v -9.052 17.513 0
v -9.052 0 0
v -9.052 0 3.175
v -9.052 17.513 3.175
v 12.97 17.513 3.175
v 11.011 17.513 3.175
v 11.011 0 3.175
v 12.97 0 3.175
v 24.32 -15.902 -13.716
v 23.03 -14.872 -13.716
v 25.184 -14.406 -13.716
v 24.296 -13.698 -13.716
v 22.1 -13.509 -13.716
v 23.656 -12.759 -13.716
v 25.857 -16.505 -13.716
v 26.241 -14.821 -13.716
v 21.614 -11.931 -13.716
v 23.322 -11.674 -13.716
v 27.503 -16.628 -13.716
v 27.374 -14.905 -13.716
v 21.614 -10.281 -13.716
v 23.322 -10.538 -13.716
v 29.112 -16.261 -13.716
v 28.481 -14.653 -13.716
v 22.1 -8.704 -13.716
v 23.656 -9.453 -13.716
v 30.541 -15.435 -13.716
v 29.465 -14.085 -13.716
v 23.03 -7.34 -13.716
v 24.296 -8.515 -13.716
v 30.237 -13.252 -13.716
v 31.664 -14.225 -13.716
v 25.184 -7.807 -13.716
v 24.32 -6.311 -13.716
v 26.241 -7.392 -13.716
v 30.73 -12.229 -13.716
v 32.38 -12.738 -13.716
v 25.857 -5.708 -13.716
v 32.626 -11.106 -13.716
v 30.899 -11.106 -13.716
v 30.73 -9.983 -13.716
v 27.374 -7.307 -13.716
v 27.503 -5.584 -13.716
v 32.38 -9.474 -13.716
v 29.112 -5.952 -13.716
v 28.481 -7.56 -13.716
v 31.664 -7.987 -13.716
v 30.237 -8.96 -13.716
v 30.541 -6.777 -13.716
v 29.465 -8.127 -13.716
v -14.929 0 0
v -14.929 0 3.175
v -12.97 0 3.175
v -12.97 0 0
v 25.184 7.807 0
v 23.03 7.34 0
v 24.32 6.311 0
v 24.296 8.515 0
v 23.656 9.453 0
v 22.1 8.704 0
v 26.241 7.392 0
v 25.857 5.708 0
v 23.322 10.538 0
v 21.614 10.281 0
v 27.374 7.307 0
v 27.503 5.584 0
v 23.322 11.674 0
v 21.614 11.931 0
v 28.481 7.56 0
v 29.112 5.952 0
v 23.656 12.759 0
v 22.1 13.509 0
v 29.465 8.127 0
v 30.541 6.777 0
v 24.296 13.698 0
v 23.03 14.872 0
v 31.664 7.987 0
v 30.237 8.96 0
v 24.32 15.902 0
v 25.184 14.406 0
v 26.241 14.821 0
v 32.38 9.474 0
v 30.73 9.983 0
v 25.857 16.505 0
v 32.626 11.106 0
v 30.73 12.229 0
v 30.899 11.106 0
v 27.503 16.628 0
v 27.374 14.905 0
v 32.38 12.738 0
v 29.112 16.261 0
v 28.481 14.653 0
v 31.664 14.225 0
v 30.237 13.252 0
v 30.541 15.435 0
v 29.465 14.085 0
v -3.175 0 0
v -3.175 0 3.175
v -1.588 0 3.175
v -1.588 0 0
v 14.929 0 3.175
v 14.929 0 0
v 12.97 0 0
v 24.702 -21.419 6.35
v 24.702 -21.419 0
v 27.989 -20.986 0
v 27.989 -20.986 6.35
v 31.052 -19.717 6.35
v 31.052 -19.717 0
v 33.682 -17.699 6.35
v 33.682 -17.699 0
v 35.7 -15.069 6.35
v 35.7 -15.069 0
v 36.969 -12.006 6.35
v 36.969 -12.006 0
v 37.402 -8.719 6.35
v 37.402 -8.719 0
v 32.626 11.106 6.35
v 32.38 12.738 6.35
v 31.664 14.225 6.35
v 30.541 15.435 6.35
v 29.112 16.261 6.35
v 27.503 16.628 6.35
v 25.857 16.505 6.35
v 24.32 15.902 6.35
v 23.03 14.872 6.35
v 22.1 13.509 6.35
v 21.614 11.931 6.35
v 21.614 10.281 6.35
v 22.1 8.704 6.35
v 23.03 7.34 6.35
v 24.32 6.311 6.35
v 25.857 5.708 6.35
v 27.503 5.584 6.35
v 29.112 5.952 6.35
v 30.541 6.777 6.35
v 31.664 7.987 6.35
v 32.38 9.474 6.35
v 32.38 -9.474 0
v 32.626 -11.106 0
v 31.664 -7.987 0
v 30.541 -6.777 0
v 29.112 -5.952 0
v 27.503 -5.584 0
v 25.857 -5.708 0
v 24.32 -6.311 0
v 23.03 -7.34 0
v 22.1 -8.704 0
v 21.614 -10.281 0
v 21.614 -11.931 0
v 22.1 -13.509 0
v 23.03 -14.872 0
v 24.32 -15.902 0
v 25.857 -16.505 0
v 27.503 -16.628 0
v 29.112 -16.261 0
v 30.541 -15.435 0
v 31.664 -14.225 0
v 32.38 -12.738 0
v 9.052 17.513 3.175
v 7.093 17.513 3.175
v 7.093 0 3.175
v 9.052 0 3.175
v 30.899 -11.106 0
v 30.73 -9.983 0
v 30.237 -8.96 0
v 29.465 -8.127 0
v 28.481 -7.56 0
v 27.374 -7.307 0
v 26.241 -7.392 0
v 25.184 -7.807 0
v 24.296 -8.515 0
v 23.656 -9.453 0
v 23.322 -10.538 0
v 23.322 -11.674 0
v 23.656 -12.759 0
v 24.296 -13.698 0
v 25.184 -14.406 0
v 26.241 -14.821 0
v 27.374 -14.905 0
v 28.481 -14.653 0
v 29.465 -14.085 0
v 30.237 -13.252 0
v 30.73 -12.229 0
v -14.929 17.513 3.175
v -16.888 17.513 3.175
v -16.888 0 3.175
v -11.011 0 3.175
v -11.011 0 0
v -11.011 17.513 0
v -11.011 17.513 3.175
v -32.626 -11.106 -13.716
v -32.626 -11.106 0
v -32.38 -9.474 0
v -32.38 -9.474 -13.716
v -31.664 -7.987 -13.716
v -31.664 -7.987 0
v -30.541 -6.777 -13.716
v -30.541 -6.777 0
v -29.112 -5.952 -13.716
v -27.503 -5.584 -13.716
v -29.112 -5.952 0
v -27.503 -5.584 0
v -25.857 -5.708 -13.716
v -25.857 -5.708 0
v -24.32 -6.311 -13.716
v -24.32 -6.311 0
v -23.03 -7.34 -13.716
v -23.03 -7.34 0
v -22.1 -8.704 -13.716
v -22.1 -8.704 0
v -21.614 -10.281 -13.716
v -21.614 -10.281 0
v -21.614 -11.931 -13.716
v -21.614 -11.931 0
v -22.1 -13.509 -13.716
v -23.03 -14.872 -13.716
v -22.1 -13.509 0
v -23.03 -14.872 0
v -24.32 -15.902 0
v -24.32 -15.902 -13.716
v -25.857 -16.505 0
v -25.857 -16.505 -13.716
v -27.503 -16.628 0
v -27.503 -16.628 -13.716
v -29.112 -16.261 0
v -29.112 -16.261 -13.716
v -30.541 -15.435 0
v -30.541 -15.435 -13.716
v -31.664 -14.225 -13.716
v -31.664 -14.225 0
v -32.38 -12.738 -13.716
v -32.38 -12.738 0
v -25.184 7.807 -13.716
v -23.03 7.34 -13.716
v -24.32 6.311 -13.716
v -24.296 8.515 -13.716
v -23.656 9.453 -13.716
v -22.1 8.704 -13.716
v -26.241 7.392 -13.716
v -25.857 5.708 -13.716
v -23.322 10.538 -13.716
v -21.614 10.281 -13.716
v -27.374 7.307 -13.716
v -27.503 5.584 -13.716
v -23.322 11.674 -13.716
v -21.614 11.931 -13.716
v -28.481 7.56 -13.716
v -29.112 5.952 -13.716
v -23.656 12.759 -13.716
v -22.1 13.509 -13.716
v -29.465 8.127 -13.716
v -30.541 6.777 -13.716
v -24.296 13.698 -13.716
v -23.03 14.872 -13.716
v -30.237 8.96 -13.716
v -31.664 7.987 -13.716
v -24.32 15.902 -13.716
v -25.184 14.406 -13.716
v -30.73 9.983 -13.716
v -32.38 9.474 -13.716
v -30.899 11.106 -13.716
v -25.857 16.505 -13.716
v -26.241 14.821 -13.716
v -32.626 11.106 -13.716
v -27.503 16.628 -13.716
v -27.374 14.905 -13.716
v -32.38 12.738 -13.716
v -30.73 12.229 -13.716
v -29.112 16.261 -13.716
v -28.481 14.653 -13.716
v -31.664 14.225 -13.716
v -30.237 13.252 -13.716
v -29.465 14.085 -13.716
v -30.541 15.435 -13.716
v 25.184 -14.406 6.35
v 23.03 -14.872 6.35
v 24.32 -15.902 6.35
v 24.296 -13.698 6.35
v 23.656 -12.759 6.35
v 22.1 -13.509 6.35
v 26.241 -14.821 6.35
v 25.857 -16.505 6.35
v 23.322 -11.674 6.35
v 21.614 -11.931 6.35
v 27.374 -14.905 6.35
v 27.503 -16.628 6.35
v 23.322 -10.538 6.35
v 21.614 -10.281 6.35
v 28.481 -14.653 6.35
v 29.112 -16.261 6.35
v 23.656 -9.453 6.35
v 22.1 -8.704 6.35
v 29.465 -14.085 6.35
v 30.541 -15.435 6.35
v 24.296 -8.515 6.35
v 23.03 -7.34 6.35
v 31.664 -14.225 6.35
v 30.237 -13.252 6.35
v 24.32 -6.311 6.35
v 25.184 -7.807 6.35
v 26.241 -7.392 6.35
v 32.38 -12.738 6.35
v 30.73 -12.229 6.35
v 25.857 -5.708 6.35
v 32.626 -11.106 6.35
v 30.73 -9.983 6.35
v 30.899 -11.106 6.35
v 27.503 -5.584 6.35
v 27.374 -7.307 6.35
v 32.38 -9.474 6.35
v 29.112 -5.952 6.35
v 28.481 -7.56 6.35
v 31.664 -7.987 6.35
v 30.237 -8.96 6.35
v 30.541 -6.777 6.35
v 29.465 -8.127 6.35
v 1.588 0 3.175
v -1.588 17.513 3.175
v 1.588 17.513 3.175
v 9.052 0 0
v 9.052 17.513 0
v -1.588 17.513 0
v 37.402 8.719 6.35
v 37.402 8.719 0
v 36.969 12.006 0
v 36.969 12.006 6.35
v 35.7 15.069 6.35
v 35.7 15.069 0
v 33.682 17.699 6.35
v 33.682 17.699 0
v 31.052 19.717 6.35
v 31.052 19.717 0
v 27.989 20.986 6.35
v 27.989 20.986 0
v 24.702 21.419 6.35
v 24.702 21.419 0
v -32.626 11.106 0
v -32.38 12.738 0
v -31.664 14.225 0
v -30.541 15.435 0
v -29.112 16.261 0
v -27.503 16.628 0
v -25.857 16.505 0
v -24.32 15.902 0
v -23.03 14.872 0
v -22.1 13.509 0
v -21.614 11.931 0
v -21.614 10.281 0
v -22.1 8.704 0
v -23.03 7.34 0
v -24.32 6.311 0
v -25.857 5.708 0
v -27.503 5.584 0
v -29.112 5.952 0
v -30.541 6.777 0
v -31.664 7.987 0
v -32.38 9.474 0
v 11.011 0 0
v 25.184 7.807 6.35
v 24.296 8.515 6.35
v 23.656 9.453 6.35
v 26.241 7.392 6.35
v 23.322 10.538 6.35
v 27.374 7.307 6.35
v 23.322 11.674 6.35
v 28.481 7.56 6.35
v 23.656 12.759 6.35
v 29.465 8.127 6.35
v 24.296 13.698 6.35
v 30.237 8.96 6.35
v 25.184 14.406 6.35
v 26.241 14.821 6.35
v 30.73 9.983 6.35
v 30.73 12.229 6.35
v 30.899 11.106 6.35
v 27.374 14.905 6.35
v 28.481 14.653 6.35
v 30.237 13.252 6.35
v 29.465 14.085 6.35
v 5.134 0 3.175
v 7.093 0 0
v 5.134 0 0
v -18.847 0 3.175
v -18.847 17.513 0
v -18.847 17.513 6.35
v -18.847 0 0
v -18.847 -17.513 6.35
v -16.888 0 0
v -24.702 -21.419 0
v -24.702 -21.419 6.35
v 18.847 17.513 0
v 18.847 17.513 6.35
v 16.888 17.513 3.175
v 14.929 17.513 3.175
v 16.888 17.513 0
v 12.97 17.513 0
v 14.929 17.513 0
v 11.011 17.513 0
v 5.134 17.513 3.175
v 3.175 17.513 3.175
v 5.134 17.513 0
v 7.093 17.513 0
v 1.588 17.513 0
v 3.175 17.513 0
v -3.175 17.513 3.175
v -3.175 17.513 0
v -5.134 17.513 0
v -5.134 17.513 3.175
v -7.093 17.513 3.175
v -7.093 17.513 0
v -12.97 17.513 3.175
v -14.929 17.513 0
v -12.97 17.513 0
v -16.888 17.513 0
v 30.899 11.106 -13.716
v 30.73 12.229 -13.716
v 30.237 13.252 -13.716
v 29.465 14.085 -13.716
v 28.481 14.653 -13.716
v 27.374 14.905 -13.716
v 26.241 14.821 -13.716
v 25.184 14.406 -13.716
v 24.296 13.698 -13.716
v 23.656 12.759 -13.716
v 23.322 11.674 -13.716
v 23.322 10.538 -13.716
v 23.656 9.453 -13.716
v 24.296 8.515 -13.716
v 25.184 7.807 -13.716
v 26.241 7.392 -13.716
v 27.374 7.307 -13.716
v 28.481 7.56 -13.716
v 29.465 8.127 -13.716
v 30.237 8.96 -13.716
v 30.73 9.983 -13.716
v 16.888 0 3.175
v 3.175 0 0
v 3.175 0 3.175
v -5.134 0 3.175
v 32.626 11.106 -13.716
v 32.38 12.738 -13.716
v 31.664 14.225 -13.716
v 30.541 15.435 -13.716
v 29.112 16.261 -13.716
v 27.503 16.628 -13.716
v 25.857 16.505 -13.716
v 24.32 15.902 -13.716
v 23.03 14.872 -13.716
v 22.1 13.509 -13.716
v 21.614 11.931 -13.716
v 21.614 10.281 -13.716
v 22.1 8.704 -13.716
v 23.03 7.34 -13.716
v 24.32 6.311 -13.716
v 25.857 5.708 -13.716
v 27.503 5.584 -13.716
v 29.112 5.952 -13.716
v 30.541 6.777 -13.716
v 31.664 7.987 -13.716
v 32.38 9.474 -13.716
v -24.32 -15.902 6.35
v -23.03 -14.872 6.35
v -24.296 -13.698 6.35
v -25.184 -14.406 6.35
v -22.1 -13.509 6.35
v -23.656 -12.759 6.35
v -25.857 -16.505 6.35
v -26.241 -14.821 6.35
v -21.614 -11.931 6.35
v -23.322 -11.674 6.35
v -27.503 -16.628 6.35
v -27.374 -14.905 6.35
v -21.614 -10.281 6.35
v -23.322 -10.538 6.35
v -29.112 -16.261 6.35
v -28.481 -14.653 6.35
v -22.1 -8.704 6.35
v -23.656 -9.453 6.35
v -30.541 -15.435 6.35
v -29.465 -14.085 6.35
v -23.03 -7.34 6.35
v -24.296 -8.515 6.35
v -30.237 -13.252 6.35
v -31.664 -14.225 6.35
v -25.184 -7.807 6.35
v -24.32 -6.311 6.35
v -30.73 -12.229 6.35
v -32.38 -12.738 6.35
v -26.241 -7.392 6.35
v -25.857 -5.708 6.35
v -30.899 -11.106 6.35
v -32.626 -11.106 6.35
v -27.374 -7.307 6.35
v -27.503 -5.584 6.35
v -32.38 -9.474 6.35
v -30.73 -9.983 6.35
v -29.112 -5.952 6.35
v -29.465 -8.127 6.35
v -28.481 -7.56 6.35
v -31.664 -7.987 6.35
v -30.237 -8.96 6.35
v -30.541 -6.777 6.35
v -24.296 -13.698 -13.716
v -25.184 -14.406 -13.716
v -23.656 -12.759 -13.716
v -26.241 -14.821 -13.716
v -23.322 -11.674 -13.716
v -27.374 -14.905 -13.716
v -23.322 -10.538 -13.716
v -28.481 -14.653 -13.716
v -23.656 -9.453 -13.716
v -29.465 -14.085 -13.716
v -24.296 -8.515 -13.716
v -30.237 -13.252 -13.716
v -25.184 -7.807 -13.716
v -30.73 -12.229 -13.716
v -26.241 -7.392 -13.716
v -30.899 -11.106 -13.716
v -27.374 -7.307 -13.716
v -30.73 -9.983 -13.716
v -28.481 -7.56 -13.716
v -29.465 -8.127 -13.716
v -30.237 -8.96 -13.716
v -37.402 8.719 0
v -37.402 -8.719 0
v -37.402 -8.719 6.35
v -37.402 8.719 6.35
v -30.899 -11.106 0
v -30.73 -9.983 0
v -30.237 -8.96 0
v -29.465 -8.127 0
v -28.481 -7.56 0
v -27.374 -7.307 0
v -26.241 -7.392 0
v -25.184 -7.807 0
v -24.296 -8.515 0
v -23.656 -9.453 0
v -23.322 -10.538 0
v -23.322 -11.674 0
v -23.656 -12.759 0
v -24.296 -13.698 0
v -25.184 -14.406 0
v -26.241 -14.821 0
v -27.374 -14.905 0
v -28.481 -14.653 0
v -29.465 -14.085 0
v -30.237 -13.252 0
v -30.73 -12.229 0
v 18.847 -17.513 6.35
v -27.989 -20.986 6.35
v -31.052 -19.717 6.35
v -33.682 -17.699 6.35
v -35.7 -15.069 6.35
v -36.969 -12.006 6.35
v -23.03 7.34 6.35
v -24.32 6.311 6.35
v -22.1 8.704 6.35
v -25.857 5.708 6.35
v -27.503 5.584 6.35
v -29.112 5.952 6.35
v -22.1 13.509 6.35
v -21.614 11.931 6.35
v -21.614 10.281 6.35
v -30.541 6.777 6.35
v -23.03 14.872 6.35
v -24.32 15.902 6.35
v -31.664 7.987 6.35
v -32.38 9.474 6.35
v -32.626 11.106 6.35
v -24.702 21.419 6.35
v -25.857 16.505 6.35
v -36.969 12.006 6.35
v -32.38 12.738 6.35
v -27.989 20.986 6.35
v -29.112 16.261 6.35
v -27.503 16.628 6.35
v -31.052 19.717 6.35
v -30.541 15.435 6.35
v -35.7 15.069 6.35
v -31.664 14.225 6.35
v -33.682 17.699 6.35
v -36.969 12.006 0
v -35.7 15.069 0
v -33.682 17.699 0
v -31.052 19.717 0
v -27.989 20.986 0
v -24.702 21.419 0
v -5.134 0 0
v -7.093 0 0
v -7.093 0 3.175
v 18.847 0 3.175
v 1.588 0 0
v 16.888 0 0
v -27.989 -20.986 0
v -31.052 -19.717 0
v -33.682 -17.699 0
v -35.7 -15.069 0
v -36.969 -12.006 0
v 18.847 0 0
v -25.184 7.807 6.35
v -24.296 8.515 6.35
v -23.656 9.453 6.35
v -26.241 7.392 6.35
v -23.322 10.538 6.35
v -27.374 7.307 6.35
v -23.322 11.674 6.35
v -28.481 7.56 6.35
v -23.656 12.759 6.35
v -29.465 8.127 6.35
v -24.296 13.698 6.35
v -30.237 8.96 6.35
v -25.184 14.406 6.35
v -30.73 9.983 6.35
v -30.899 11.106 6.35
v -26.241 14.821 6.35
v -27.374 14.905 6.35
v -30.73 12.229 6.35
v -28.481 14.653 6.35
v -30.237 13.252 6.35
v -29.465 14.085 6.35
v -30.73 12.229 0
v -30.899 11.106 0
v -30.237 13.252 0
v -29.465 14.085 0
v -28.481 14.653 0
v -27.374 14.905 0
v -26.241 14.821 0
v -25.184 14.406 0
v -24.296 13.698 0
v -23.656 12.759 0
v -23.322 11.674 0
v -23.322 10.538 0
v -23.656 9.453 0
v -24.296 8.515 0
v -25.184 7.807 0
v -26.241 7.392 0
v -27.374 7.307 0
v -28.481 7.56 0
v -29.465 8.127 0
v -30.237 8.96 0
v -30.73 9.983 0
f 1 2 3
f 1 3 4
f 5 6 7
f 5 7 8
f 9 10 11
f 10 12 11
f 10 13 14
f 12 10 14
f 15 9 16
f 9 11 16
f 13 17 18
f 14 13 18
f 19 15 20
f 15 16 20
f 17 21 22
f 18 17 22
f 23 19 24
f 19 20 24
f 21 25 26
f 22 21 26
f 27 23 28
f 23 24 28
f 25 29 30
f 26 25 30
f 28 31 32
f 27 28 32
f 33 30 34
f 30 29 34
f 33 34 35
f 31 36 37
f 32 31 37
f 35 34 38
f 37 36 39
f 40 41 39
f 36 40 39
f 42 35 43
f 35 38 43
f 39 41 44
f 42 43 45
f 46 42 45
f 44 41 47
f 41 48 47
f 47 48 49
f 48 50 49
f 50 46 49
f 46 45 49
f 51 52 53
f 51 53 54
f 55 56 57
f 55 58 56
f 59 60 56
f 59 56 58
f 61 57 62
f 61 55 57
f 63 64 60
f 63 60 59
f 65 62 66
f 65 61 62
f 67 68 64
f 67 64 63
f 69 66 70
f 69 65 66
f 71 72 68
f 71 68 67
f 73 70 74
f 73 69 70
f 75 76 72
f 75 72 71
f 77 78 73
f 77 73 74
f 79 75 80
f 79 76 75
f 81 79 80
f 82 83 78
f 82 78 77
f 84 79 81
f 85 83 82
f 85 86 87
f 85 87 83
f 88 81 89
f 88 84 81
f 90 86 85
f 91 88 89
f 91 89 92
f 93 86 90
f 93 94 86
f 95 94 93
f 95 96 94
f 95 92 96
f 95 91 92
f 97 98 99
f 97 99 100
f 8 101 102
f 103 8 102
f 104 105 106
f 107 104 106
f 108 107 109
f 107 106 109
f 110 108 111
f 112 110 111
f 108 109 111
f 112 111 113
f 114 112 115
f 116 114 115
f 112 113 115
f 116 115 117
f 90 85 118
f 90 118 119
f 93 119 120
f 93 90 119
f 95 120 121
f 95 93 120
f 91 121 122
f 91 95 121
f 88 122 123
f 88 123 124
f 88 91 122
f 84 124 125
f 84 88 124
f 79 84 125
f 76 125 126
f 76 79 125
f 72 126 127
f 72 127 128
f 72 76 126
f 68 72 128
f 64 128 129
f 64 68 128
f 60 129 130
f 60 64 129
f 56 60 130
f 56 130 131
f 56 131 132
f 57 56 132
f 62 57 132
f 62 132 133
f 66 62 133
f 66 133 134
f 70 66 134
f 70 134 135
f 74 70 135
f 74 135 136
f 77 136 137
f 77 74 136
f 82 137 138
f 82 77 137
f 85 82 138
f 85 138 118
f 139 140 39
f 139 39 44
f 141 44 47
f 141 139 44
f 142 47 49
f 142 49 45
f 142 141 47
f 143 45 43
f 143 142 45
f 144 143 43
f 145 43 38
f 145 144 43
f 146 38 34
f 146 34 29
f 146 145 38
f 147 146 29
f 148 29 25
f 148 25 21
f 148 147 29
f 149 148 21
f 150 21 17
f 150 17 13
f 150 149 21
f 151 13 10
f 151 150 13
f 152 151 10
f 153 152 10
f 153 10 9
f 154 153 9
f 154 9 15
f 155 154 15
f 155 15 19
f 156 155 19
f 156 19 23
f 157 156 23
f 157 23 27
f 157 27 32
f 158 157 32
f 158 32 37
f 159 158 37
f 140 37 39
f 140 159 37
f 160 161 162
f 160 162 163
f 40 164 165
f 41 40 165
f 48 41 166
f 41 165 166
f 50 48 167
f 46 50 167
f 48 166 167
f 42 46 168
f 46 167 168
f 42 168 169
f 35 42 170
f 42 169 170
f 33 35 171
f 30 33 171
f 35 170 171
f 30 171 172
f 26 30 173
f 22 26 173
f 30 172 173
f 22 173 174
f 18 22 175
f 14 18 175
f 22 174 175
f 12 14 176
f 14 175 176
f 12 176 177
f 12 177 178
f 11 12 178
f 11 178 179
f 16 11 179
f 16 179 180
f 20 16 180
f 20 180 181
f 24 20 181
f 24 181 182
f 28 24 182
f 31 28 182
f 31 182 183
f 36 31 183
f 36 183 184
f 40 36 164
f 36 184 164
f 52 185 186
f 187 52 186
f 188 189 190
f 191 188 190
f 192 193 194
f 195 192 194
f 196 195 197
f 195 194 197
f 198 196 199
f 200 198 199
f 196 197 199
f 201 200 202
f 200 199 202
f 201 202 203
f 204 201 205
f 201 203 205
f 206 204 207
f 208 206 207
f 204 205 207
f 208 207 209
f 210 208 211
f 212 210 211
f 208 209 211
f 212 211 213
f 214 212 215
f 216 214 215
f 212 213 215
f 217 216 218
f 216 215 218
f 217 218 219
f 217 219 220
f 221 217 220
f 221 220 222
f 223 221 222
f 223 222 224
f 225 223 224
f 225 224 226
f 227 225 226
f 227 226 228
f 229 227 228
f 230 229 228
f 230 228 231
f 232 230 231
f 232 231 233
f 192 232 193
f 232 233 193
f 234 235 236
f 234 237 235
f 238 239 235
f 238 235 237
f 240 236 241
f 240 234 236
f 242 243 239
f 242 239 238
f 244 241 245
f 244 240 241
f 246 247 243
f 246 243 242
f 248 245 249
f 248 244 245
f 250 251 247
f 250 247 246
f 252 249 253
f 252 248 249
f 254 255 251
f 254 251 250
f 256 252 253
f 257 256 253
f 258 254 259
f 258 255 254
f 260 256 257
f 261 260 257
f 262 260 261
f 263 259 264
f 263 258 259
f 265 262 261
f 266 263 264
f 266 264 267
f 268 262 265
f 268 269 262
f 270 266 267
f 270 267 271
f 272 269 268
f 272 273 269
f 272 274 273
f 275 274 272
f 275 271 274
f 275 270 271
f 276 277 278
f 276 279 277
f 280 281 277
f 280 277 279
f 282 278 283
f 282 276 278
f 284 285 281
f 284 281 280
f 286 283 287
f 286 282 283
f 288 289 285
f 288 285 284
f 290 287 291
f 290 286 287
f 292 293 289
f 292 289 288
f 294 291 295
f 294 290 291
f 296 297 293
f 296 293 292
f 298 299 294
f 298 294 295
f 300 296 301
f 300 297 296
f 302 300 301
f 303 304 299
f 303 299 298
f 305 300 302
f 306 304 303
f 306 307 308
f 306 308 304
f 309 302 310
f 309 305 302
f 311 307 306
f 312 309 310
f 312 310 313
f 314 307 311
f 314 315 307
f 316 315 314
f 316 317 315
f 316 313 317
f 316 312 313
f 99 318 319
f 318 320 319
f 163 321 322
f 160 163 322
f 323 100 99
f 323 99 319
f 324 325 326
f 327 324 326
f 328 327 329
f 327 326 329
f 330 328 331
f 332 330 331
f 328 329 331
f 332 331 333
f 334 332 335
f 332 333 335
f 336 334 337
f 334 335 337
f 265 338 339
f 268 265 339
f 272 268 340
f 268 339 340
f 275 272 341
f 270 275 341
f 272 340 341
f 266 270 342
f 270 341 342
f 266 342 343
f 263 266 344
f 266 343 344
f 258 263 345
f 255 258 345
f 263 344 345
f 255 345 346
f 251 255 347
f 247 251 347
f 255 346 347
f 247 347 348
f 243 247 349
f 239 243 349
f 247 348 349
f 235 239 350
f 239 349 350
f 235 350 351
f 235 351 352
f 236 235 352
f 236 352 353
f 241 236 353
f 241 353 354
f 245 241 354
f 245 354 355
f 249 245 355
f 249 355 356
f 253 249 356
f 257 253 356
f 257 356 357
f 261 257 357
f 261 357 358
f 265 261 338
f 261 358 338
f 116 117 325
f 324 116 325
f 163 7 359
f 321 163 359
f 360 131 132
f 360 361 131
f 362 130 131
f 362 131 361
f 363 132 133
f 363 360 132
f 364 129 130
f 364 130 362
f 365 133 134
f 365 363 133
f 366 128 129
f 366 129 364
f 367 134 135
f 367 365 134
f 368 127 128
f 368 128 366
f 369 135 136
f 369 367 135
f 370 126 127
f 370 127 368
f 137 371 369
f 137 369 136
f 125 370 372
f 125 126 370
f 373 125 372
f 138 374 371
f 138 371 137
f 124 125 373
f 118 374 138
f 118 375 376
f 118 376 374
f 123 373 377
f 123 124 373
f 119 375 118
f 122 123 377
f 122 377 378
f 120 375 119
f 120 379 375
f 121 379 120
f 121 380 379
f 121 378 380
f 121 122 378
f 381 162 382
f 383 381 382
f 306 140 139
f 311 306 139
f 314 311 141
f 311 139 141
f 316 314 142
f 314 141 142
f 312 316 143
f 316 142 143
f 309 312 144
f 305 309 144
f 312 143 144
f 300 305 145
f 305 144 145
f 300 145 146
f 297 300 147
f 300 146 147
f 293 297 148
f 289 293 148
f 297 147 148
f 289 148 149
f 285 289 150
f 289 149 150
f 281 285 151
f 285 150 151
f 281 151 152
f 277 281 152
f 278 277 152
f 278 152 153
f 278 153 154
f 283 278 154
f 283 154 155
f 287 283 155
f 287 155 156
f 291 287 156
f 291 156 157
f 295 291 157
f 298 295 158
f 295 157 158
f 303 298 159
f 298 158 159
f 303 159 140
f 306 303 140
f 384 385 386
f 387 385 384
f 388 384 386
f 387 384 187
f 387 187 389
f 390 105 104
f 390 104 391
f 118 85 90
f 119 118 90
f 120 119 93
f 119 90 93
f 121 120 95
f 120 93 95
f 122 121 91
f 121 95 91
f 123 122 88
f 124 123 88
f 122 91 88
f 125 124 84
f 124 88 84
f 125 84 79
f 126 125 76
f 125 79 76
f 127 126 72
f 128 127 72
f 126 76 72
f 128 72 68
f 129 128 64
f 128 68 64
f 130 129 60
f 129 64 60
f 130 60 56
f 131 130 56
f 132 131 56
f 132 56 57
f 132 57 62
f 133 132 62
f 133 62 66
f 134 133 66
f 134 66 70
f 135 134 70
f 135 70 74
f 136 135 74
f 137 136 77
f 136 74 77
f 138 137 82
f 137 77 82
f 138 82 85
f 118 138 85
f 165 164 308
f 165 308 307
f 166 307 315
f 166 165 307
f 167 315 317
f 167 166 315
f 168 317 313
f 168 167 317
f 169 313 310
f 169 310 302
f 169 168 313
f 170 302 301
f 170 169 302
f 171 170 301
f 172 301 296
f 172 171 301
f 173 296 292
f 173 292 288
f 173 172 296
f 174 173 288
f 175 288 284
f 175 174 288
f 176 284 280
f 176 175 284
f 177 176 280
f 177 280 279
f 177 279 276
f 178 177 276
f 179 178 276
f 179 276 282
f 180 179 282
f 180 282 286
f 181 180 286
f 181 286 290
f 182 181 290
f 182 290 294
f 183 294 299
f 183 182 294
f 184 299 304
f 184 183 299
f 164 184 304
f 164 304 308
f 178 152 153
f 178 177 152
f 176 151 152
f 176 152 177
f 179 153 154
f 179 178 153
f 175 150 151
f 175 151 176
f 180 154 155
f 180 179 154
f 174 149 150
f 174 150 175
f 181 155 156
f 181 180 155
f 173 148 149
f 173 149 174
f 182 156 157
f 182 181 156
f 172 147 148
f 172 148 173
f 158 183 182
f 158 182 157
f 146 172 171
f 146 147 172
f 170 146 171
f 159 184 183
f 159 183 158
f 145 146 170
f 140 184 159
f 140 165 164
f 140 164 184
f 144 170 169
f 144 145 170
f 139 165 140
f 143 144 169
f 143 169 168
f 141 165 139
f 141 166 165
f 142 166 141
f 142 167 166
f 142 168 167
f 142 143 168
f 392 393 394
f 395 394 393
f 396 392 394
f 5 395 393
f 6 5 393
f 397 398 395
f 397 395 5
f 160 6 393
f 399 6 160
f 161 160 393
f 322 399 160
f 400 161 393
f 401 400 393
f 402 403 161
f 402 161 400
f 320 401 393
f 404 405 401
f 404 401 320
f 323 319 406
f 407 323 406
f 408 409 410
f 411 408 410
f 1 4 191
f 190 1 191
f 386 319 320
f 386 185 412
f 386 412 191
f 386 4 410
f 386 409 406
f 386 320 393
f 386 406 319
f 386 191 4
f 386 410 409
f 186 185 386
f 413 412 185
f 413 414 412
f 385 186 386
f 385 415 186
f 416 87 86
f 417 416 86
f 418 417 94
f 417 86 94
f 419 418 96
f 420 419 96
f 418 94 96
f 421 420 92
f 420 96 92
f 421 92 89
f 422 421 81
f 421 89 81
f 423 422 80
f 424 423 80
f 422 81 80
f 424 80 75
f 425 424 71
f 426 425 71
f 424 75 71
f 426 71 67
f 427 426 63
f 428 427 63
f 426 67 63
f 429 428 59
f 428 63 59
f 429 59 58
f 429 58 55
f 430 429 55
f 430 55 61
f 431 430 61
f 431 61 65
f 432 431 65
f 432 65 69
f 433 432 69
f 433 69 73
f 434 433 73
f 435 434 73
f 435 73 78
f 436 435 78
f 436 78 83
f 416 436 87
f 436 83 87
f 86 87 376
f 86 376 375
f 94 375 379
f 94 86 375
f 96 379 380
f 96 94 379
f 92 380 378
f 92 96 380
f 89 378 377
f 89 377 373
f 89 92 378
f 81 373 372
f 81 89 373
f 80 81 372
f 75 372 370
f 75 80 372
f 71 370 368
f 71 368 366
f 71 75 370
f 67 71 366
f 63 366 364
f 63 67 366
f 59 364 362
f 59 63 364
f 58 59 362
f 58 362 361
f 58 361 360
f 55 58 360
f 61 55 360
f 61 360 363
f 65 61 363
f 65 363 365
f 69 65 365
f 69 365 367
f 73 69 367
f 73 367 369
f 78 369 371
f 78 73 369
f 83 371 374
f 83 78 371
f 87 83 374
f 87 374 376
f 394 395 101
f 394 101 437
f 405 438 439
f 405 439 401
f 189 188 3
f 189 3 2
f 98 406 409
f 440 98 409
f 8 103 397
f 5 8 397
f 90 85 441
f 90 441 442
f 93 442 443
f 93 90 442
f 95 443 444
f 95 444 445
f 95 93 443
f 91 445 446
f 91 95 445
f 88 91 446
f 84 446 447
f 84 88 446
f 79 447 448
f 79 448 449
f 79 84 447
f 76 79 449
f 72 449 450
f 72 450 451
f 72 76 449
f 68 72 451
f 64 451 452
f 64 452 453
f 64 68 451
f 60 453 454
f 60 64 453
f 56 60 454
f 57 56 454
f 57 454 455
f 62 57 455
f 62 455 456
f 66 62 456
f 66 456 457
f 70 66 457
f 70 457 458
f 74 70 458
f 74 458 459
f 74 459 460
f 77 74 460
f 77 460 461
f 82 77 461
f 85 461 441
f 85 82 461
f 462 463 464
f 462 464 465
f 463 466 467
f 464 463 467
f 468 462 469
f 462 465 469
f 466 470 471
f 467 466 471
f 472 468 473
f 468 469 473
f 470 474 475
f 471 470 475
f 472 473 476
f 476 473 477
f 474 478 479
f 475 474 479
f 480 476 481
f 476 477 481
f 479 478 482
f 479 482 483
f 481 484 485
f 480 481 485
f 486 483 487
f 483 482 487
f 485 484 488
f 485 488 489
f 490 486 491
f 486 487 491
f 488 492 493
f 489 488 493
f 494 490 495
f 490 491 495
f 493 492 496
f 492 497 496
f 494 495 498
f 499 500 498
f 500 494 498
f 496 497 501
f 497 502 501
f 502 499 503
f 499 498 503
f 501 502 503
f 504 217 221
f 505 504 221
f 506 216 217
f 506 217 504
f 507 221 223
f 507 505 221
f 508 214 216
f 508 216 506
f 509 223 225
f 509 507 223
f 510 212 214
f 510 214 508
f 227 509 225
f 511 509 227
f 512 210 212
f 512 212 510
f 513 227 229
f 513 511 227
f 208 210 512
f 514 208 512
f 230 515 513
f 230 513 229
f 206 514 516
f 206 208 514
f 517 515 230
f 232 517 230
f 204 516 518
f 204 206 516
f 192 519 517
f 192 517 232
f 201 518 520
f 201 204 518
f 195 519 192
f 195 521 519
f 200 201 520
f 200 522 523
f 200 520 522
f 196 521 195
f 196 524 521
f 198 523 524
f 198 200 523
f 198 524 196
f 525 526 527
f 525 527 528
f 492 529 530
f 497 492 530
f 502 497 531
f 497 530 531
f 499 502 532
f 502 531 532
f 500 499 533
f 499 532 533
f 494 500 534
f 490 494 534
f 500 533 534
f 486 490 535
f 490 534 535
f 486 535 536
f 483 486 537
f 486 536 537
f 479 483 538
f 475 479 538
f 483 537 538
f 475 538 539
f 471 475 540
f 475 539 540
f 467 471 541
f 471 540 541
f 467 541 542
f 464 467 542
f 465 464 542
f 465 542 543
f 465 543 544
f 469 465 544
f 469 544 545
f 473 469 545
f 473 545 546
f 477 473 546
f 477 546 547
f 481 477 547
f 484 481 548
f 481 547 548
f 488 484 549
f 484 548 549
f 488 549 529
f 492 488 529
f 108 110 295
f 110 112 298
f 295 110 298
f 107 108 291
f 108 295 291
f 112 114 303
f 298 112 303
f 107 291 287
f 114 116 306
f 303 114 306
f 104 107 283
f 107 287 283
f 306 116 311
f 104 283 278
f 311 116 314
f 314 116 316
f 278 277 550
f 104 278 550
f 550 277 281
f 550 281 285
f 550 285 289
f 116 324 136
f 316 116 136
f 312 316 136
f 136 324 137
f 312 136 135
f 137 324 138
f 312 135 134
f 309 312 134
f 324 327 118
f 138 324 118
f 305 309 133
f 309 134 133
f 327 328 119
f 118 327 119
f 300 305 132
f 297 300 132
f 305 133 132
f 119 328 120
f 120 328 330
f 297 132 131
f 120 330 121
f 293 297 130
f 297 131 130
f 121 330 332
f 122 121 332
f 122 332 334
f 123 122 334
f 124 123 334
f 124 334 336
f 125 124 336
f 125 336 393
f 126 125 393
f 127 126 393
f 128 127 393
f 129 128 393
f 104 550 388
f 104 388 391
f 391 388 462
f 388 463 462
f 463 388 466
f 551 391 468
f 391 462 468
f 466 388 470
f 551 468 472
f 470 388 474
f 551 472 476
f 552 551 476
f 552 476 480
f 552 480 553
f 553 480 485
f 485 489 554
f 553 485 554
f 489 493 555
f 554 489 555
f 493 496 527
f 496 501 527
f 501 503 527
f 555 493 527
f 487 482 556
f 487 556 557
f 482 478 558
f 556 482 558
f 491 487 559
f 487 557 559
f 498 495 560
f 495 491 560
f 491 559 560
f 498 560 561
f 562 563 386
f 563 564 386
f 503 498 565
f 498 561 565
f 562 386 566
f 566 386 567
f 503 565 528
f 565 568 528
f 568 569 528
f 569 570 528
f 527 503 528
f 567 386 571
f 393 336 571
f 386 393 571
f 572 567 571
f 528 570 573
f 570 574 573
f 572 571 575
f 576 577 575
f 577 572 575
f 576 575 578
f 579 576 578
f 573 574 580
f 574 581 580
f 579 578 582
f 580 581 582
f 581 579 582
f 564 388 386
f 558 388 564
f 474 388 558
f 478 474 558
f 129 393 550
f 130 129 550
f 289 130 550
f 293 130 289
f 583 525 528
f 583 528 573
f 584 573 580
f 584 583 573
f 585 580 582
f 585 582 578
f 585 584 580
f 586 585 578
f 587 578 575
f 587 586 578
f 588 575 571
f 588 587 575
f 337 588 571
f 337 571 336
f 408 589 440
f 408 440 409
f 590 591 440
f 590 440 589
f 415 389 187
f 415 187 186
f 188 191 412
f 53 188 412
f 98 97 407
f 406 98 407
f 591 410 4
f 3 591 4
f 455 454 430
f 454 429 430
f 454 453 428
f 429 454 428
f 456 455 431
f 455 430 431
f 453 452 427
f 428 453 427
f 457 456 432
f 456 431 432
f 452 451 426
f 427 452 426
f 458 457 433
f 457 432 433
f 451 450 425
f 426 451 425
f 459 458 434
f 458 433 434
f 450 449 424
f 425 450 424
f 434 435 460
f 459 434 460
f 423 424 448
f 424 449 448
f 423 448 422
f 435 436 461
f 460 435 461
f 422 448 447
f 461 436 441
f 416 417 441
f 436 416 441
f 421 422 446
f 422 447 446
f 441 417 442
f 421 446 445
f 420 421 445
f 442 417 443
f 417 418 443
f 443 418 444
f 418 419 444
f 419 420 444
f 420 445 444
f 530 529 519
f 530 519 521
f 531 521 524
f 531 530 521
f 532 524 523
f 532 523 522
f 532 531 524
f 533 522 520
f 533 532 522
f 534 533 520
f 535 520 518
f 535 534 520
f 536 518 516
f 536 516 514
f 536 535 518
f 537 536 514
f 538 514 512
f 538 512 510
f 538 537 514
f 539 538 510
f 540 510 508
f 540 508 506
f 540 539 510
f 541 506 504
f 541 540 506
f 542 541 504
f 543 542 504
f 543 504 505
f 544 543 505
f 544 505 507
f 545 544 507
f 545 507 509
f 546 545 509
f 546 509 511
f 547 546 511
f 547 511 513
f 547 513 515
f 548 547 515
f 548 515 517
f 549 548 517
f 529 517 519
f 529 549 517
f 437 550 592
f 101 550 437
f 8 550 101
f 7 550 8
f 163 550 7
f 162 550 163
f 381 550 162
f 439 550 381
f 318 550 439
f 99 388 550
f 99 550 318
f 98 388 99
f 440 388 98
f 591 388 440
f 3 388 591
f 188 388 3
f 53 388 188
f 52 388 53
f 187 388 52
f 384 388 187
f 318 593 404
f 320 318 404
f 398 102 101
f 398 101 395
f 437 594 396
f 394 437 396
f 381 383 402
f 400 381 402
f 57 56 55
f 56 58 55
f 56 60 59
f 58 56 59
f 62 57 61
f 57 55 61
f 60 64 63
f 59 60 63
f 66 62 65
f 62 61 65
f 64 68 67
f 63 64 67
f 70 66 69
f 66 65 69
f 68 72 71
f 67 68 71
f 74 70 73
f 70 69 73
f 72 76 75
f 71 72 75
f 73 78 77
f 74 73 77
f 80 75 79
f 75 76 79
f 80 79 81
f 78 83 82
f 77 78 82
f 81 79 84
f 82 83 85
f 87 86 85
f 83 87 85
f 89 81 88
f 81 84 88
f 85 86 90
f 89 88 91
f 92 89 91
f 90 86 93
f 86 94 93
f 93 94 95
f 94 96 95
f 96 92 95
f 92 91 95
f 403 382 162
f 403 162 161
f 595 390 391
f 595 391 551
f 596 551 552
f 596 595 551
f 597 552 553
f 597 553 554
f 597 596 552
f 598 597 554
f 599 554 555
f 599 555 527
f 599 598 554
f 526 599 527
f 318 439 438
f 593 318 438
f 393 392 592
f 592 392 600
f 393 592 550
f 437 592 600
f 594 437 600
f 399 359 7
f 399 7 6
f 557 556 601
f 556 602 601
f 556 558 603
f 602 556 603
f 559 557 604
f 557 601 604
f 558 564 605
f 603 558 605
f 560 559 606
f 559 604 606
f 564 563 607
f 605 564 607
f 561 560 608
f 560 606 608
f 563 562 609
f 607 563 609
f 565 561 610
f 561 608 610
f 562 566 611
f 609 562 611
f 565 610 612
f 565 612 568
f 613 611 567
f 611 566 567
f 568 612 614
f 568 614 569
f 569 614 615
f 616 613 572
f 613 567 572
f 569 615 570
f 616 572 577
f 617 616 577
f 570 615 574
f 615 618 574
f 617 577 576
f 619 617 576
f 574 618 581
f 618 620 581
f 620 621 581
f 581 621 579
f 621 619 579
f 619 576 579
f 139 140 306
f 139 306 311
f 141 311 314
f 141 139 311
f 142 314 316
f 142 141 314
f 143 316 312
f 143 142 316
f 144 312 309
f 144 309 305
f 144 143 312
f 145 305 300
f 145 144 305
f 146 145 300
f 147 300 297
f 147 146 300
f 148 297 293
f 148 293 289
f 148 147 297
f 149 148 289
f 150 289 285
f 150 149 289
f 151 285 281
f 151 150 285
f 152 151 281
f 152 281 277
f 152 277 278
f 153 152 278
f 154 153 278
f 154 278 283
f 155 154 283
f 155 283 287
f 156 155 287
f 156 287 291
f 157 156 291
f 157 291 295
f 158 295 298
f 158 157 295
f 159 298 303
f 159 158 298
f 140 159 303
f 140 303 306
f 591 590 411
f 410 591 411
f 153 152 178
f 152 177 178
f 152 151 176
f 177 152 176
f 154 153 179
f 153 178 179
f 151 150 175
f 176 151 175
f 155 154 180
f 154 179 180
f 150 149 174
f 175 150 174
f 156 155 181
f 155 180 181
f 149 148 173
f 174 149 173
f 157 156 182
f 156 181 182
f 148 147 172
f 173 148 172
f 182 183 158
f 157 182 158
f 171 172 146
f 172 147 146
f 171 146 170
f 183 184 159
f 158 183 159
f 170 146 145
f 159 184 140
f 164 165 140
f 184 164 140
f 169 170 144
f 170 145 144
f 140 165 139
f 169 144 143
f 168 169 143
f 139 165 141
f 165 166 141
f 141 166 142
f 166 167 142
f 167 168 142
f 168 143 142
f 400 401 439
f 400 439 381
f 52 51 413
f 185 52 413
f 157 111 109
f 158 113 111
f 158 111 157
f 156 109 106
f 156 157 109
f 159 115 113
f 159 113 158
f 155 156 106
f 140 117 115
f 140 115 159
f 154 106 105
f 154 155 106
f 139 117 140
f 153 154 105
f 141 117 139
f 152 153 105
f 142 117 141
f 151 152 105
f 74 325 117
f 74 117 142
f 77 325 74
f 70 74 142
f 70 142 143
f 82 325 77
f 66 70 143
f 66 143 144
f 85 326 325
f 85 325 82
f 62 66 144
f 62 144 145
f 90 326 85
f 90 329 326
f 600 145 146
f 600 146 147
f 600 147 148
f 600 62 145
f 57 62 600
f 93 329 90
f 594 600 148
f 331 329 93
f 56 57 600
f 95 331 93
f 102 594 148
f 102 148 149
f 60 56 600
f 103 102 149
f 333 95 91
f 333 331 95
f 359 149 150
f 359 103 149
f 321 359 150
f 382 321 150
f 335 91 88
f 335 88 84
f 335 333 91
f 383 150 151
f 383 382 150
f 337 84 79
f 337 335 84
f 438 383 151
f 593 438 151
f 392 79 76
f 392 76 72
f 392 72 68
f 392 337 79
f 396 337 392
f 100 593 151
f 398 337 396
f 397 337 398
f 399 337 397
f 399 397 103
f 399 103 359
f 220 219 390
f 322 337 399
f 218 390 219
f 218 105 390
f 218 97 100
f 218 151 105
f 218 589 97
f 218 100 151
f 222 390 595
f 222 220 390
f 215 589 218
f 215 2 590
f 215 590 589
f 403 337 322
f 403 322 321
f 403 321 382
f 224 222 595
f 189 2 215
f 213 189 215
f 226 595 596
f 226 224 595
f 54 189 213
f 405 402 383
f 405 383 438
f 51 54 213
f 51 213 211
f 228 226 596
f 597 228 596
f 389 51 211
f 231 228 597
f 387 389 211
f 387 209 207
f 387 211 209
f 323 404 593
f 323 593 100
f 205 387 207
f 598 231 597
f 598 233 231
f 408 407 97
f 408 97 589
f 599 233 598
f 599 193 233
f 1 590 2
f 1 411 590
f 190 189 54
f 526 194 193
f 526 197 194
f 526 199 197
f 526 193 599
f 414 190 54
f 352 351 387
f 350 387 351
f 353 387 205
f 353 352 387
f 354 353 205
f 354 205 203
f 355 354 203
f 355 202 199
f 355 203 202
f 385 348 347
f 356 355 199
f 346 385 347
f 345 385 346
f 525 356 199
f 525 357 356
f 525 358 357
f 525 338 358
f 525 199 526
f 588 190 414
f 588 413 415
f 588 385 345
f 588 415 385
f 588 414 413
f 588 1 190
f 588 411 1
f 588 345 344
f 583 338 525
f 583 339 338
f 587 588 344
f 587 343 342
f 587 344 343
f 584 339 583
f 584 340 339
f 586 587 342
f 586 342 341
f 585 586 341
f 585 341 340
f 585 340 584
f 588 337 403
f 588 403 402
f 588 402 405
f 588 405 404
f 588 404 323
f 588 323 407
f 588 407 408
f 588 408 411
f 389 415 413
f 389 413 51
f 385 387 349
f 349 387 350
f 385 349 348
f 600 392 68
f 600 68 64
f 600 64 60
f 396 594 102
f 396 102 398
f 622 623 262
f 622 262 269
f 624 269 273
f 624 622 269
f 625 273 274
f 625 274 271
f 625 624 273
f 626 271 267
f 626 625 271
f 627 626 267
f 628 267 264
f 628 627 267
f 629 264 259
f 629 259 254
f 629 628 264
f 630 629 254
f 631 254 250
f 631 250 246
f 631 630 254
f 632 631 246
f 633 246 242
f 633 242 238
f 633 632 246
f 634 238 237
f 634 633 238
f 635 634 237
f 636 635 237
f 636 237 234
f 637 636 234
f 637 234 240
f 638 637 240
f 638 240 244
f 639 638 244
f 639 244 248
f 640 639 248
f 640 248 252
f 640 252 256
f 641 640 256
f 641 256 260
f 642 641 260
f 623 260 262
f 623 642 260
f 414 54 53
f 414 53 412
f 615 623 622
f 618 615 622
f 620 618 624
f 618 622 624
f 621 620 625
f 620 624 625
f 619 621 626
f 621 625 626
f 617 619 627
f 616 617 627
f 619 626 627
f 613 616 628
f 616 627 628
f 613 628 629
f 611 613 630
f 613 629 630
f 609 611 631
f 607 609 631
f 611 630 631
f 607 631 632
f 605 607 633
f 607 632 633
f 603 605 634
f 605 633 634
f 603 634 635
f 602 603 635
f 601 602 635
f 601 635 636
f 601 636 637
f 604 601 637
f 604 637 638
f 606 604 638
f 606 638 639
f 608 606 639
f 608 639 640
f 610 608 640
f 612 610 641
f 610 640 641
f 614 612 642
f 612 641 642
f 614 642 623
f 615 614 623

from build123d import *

# Parameters (mm, degrees)
F0_R     = 5.5372
F1_DEPTH = 6.35
F3_DEPTH = 18.8468
F0_W     = 1.5875
F0_H     = 17.5133
F0_W_2   = 1.958975
F4_DEPTH = 3.175
F0_R_2   = 3.81
F5_DEPTH = 13.716
F6_DEPTH = 6.35


with BuildPart() as f1:
    # F0 (on Top) → F1 (new body)
    with BuildSketch(Plane.XY):
        with BuildLine():
            ThreePointArc((37.4015, 8.71855), (33.6817561211, 17.6988061211), (24.7015, 21.41855))
            Line((24.7015, 21.41855), (0, 21.41855))
            Line((0, 21.41855), (0, 17.5133))
            Line((0, 17.5133), (1.5875, 17.5133))
            Line((1.5875, 17.5133), (3.175, 17.5133))
            Line((3.175, 17.5133), (5.133975, 17.5133))
            Line((5.133975, 17.5133), (7.09295, 17.5133))
            Line((7.09295, 17.5133), (9.051925, 17.5133))
            Line((9.051925, 17.5133), (11.0109, 17.5133))
            Line((11.0109, 17.5133), (12.969875, 17.5133))
            Line((12.969875, 17.5133), (14.92885, 17.5133))
            Line((14.92885, 17.5133), (16.887825, 17.5133))
            Line((16.887825, 17.5133), (18.8468, 17.5133))
            Line((18.8468, 17.5133), (18.8468, 0))
            Line((18.8468, 0), (18.8468, -17.5133))
            Line((18.8468, -17.5133), (0, -17.5133))
            Line((0, -17.5133), (0, -21.41855))
            Line((0, -21.41855), (24.7015, -21.41855))
            ThreePointArc((24.7015, -21.41855), (33.6817561211, -17.6988061211), (37.4015, -8.71855))
            Line((37.4015, -8.71855), (37.4015, 8.71855))
        make_face()
        with Locations((27.0891, -11.10615)):
            Circle(F0_R, mode=Mode.SUBTRACT)
        with Locations((27.0891, 11.10615)):
            Circle(F0_R, mode=Mode.SUBTRACT)
    extrude(amount=F1_DEPTH)

    # F2 (on face) → F3 (join)
    with BuildSketch(Plane(origin=(18.8468, 0, 0), x_dir=(0, -1, 0), z_dir=(-1, 0, 0))):
        Polygon((0, 3.175), (0, 0), (17.5133, 0), (17.5133, 6.35), align=None)
    extrude(amount=F3_DEPTH)

    # F0 (on Top) → F4 (join)
    with BuildSketch(Plane.XY):
        with Locations((0.79375, 8.75665)):
            Rectangle(F0_W, F0_H)
        with Locations((4.1544875, 8.75665)):
            Rectangle(F0_W_2, F0_H)
        with Locations((8.0724375, 8.75665)):
            Rectangle(F0_W_2, F0_H)
        with Locations((11.9903875, 8.75665)):
            Rectangle(F0_W_2, F0_H)
        with Locations((15.9083375, 8.75665)):
            Rectangle(F0_W_2, F0_H)
    extrude(amount=F4_DEPTH)

    # F0 (on Top) → F5 (join)
    with BuildSketch(Plane.XY):
        with Locations((27.0891, 11.10615)):
            Circle(F0_R)
        with Locations((27.0891, 11.10615)):
            Circle(F0_R_2, mode=Mode.SUBTRACT)
        with Locations((27.0891, -11.10615)):
            Circle(F0_R)
        with Locations((27.0891, -11.10615)):
            Circle(F0_R_2, mode=Mode.SUBTRACT)
    extrude(amount=-F5_DEPTH)


with BuildPart() as f6:
    # F6 (new): a face of the model
    f6_faces = [f1.part.faces().sort_by_distance(p)[0] for p in [
        (21.7085156668, 11.10615, 0),
    ]]
    extrude(f6_faces, amount=F6_DEPTH)


with BuildPart() as f6b:
    # F6#2 (new): a face of the model
    f6_2_faces = [f1.part.faces().sort_by_distance(p)[0] for p in [
        (21.7085156668, -11.10615, 0),
    ]]
    extrude(f6_2_faces, amount=F6_DEPTH)


with BuildPart() as f1_1:
    add(f1.part)

    # F7: F1, F6, F6b across plane
    add(f1.part.mirror(Plane.YZ))
    add(f6.part.mirror(Plane.YZ))
    add(f6b.part.mirror(Plane.YZ))


solid = Compound([f6.part, f6b.part, f1_1.part])
